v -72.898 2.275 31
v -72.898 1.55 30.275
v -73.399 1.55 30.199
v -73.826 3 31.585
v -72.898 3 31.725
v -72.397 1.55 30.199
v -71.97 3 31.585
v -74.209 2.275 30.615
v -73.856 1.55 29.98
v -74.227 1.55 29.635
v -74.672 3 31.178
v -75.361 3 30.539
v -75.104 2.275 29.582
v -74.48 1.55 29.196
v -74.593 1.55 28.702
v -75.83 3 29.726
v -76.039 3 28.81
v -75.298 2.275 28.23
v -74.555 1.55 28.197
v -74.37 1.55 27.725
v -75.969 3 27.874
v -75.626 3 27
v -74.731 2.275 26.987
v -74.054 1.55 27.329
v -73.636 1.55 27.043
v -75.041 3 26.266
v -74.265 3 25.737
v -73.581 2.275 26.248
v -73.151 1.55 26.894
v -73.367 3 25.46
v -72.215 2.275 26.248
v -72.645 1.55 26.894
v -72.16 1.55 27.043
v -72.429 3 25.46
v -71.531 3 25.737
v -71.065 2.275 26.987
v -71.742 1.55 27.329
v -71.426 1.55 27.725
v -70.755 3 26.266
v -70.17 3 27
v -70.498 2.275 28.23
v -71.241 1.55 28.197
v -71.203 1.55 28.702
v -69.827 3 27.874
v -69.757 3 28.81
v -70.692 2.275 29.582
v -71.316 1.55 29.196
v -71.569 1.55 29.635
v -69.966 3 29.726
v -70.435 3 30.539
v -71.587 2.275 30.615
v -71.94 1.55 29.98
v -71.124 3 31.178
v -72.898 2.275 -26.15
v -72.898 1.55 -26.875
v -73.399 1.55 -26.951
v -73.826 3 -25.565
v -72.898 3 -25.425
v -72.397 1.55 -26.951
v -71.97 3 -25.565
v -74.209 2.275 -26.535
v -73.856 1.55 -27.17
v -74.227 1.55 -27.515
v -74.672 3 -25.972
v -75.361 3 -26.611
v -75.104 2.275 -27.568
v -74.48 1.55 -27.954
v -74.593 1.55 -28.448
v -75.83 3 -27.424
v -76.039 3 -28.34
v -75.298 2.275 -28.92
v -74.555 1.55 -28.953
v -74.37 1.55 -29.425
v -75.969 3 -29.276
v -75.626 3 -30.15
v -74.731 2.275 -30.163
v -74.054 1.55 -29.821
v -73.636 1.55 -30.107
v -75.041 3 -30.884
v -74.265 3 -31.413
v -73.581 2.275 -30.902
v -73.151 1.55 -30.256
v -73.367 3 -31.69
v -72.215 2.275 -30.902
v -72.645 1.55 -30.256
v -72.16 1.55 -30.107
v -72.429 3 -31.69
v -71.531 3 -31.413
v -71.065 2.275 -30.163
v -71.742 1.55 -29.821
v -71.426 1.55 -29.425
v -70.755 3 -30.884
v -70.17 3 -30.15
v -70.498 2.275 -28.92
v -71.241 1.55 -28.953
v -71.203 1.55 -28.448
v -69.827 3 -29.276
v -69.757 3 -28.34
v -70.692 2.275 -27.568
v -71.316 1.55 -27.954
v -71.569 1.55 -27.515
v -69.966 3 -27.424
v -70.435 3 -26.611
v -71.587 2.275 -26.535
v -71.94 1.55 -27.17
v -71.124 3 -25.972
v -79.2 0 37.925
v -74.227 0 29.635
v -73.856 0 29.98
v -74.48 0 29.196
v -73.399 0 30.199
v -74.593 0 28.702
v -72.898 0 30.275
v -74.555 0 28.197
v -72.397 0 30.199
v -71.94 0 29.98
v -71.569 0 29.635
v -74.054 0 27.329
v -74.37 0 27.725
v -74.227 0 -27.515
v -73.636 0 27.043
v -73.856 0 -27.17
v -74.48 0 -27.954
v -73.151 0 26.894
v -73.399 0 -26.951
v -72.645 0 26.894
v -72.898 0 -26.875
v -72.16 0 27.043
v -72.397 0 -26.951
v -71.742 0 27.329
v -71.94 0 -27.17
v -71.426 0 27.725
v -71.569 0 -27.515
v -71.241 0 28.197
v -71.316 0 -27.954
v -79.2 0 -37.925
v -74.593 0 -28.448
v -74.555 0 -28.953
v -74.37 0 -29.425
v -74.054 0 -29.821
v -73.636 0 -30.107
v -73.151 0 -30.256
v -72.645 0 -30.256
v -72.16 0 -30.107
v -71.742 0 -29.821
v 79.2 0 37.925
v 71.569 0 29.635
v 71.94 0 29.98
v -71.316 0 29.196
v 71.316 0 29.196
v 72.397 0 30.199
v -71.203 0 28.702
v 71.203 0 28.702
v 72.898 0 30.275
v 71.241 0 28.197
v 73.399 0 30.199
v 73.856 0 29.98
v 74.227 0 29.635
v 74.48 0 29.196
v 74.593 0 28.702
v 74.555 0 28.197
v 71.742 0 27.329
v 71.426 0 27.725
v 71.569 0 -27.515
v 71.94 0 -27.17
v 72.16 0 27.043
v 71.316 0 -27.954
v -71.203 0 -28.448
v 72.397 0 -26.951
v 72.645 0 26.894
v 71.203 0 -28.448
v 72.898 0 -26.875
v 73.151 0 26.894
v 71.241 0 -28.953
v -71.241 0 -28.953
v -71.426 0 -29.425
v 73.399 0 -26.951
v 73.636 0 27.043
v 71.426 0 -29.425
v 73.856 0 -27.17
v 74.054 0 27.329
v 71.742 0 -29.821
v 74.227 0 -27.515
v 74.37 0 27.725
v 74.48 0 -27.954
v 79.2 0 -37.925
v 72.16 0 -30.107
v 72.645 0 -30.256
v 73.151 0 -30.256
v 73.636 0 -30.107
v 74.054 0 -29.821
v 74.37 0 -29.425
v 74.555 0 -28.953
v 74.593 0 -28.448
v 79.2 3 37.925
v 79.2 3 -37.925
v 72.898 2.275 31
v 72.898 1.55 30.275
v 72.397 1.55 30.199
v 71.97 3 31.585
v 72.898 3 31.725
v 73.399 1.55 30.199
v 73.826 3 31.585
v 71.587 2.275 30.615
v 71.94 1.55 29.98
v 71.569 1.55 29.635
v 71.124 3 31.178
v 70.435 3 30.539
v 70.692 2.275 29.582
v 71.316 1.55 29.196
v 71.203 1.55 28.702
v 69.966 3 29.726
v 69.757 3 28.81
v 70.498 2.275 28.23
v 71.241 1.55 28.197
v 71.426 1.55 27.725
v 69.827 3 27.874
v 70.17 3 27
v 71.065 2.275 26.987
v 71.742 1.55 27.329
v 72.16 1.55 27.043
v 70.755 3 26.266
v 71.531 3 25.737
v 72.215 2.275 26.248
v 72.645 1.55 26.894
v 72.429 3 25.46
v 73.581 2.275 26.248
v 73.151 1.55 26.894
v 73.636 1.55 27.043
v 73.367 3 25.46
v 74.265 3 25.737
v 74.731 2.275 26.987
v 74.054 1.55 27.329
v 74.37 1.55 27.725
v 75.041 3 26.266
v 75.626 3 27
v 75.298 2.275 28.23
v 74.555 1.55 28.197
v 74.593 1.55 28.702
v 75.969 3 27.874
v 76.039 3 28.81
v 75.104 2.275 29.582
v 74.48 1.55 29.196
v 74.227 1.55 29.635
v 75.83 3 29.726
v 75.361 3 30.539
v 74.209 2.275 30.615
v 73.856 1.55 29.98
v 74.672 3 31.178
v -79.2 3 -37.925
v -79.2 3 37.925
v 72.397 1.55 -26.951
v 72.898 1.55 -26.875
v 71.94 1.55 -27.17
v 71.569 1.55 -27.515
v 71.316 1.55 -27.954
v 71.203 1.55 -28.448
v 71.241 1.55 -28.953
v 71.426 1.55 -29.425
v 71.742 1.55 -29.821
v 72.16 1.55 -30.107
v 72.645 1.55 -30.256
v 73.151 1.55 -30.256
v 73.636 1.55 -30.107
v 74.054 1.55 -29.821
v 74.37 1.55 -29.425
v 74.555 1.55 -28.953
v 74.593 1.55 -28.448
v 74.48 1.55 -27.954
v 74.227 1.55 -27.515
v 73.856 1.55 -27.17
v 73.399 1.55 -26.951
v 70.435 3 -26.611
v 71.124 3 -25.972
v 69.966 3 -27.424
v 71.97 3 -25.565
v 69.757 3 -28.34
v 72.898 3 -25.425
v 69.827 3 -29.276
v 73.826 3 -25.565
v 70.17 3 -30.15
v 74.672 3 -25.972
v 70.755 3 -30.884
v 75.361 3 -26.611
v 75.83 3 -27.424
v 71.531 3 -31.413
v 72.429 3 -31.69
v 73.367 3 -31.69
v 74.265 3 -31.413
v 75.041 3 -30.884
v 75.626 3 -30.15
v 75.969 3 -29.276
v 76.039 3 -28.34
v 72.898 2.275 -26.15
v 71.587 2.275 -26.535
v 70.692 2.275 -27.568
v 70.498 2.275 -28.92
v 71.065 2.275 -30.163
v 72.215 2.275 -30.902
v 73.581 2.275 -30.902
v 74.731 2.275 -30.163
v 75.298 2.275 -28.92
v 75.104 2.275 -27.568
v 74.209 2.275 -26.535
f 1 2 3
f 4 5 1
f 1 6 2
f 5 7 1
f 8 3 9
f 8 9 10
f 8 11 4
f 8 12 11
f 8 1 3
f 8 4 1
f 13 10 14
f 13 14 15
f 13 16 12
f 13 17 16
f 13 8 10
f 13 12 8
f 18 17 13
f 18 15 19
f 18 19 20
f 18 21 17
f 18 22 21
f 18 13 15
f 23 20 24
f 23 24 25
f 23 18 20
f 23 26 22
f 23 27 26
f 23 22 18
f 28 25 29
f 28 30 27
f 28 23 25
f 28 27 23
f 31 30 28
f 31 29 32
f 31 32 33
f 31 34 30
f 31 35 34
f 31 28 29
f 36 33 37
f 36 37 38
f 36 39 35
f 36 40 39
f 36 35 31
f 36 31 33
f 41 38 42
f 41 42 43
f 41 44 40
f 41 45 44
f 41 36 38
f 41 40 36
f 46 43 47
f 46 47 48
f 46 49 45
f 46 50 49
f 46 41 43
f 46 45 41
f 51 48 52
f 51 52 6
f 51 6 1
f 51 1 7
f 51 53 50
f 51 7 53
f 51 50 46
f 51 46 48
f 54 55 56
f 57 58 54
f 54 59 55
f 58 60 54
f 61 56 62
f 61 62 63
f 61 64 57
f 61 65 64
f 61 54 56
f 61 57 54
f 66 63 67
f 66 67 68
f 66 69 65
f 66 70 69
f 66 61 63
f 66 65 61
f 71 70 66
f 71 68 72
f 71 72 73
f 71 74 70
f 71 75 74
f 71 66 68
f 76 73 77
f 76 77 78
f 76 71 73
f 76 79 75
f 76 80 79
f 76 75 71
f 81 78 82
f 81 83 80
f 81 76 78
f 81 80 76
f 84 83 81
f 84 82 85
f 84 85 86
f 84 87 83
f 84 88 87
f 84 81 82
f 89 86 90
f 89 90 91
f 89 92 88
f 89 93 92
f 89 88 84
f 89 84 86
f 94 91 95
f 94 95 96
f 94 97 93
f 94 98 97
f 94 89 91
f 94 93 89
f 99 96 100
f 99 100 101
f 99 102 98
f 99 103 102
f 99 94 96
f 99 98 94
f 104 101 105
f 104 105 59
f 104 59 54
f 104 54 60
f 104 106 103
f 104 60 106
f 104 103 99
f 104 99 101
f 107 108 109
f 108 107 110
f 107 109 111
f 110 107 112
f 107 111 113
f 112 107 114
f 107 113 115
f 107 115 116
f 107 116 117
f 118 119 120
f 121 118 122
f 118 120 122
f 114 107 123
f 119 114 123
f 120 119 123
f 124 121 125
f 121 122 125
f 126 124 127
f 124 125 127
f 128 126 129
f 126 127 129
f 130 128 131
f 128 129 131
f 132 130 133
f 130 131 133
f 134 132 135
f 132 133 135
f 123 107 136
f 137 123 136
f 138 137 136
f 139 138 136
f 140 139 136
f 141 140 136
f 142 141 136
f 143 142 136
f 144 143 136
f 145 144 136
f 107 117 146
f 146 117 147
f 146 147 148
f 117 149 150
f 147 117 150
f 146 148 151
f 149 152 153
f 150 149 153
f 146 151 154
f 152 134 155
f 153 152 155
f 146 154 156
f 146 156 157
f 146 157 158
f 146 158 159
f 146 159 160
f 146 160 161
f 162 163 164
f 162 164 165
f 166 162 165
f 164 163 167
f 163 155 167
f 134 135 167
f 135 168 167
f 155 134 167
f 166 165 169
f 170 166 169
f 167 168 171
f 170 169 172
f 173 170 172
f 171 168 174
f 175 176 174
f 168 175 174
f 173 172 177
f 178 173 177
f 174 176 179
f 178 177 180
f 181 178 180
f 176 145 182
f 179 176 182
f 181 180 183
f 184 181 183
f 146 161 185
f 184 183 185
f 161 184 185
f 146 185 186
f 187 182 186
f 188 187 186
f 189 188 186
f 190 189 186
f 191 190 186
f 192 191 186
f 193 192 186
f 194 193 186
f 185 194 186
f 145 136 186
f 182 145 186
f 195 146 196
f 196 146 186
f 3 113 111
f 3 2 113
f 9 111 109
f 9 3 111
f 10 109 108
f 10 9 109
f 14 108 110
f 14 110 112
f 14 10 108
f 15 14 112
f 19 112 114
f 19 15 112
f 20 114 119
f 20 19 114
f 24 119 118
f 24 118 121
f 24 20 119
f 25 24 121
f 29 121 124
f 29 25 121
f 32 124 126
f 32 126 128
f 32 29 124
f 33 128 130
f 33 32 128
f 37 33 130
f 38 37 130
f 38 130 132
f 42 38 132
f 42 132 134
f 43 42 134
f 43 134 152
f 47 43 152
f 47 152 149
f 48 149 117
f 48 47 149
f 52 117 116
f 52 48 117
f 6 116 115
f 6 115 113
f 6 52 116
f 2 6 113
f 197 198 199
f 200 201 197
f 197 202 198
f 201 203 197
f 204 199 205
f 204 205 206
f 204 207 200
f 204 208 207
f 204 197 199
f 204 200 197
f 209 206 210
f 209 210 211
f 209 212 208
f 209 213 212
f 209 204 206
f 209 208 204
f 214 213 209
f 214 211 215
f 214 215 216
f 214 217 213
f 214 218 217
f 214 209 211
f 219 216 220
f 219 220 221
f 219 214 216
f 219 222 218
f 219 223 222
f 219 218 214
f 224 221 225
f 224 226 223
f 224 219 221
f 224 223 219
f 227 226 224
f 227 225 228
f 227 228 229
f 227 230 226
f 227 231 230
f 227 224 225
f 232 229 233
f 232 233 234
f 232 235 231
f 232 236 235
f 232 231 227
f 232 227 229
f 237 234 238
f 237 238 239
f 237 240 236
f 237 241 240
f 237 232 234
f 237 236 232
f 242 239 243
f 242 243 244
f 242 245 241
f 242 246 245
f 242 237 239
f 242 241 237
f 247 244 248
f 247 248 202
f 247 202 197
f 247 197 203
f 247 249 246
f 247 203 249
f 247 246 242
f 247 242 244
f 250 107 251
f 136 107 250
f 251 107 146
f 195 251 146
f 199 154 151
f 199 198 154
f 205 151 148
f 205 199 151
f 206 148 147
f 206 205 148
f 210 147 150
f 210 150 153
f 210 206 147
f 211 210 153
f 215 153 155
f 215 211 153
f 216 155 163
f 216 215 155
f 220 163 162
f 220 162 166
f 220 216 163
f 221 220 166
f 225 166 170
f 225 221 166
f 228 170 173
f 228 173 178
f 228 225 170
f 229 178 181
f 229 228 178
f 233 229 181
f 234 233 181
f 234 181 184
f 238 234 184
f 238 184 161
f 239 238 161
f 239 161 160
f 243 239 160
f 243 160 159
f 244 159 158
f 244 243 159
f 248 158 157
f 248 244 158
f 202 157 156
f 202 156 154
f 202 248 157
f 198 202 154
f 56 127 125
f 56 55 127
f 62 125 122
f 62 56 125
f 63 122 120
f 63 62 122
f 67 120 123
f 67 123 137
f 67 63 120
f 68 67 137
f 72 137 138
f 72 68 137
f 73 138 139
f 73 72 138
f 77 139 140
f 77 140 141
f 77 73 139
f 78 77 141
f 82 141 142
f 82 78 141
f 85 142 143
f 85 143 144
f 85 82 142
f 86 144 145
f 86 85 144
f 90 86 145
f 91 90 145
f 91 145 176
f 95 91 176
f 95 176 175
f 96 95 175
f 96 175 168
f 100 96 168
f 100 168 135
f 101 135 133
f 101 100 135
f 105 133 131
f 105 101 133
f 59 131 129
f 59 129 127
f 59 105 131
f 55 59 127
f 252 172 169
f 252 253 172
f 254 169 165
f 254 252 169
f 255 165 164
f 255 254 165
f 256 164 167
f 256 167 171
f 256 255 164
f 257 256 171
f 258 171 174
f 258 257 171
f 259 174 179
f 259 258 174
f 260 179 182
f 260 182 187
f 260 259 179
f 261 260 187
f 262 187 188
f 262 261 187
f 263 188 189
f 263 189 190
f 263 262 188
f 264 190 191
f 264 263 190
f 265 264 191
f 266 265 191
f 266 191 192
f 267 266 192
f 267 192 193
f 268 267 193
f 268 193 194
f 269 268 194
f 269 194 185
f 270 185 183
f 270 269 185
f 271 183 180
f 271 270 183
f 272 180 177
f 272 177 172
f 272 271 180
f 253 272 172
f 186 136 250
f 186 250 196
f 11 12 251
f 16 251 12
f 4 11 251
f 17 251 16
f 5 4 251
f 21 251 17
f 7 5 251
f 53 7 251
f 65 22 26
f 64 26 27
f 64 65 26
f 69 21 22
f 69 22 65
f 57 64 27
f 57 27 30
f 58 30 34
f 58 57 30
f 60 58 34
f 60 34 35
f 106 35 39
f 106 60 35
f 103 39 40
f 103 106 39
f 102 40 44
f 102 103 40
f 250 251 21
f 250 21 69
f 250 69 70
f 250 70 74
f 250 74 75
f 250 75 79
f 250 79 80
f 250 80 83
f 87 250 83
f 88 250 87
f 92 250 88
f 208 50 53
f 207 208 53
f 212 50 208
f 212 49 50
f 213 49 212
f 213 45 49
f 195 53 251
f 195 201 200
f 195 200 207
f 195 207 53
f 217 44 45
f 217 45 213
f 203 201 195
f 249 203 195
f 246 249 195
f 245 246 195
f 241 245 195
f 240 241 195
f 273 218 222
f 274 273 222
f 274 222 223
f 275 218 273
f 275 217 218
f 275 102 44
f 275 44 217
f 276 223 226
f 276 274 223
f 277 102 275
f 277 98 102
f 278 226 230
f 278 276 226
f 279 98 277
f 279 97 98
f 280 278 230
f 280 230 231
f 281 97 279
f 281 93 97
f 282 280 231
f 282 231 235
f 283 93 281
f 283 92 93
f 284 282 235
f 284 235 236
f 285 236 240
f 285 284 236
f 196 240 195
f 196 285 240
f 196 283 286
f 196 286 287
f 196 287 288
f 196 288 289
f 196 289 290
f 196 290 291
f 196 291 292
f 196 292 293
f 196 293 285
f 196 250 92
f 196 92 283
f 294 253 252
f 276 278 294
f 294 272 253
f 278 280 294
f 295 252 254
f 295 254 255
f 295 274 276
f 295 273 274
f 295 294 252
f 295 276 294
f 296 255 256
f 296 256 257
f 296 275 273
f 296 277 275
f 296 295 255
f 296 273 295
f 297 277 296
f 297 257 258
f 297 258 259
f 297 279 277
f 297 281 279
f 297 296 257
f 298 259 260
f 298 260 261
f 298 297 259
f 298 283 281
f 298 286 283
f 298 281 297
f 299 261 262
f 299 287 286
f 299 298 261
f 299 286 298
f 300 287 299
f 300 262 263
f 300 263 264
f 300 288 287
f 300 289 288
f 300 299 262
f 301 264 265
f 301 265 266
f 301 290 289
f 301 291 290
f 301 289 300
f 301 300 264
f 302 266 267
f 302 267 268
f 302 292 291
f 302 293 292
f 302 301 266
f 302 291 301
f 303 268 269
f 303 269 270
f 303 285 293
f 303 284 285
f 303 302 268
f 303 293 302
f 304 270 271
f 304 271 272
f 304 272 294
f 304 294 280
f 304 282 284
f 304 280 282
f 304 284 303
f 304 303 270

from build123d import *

# Parameters (mm, degrees)
SKETCH1_W                                    = 158.400000192
SKETCH1_H                                    = 75.850000192
BOSS_EXTRUDE1_DEPTH                          = 3
CSK_FOR_M3_COUNTERSUNK_FLAT_HEAD_SCR_2_COUNT = 2
CSK_FOR_M3_COUNTERSUNK_FLAT_HEAD_SCR_2_PITCH = 57.15
CSK_FOR_M3_COUNTERSUNK_FLAT_HEAD_SCR_3_COUNT = 2
CSK_FOR_M3_COUNTERSUNK_FLAT_HEAD_SCR_3_PITCH = 156.596922435
CSK_FOR_M3_COUNTERSUNK_FLAT_HEAD_SCR_4_COUNT = 2
CSK_FOR_M3_COUNTERSUNK_FLAT_HEAD_SCR_4_PITCH = 145.796


with BuildPart() as part:
    # Sketch1 → Boss-Extrude1 (new body)
    with BuildSketch(Plane(origin=(0, 0, 0), x_dir=(1, 0, 0), z_dir=(0, 1, 0))):
        Rectangle(SKETCH1_W, SKETCH1_H)
    extrude(amount=BOSS_EXTRUDE1_DEPTH)

    # Sketch3 → CSK for M3 Countersunk Flat Head Screw1 (revolve, cut)
    with BuildSketch(Plane(origin=(-72.898, 3, -28.575), x_dir=(0, 0, 1), z_dir=(1, 0, 0))):
        Polygon((0, 0), (0, 3), (1.7, 3), (1.7, 1.45), (3.15, 0), align=None)
    csk_for_m3_countersunk_flat_head_screw1 = revolve(axis=Axis((-72.898, 9.35, -28.575), (0, -1, 0)), mode=Mode.SUBTRACT)

    # CSK for M3 Countersunk Flat Head Scr 2: CSK for M3 Countersunk Flat Head Screw1 ×2
    with Locations(*[(0, 0, i * CSK_FOR_M3_COUNTERSUNK_FLAT_HEAD_SCR_2_PITCH) for i in range(1, CSK_FOR_M3_COUNTERSUNK_FLAT_HEAD_SCR_2_COUNT)]):
        add(csk_for_m3_countersunk_flat_head_screw1, mode=Mode.SUBTRACT)

    # CSK for M3 Countersunk Flat Head Scr 3: CSK for M3 Countersunk Flat Head Screw1 ×2
    with Locations(*[Vector(0.9310272368912862, 0, 0.3649497008720199) * (i * CSK_FOR_M3_COUNTERSUNK_FLAT_HEAD_SCR_3_PITCH) for i in range(1, CSK_FOR_M3_COUNTERSUNK_FLAT_HEAD_SCR_3_COUNT)]):
        add(csk_for_m3_countersunk_flat_head_screw1, mode=Mode.SUBTRACT)

    # CSK for M3 Countersunk Flat Head Scr 4: CSK for M3 Countersunk Flat Head Screw1 ×2
    with Locations(*[(i * CSK_FOR_M3_COUNTERSUNK_FLAT_HEAD_SCR_4_PITCH, 0, 0) for i in range(1, CSK_FOR_M3_COUNTERSUNK_FLAT_HEAD_SCR_4_COUNT)]):
        add(csk_for_m3_countersunk_flat_head_screw1, mode=Mode.SUBTRACT)


solid = part.part
